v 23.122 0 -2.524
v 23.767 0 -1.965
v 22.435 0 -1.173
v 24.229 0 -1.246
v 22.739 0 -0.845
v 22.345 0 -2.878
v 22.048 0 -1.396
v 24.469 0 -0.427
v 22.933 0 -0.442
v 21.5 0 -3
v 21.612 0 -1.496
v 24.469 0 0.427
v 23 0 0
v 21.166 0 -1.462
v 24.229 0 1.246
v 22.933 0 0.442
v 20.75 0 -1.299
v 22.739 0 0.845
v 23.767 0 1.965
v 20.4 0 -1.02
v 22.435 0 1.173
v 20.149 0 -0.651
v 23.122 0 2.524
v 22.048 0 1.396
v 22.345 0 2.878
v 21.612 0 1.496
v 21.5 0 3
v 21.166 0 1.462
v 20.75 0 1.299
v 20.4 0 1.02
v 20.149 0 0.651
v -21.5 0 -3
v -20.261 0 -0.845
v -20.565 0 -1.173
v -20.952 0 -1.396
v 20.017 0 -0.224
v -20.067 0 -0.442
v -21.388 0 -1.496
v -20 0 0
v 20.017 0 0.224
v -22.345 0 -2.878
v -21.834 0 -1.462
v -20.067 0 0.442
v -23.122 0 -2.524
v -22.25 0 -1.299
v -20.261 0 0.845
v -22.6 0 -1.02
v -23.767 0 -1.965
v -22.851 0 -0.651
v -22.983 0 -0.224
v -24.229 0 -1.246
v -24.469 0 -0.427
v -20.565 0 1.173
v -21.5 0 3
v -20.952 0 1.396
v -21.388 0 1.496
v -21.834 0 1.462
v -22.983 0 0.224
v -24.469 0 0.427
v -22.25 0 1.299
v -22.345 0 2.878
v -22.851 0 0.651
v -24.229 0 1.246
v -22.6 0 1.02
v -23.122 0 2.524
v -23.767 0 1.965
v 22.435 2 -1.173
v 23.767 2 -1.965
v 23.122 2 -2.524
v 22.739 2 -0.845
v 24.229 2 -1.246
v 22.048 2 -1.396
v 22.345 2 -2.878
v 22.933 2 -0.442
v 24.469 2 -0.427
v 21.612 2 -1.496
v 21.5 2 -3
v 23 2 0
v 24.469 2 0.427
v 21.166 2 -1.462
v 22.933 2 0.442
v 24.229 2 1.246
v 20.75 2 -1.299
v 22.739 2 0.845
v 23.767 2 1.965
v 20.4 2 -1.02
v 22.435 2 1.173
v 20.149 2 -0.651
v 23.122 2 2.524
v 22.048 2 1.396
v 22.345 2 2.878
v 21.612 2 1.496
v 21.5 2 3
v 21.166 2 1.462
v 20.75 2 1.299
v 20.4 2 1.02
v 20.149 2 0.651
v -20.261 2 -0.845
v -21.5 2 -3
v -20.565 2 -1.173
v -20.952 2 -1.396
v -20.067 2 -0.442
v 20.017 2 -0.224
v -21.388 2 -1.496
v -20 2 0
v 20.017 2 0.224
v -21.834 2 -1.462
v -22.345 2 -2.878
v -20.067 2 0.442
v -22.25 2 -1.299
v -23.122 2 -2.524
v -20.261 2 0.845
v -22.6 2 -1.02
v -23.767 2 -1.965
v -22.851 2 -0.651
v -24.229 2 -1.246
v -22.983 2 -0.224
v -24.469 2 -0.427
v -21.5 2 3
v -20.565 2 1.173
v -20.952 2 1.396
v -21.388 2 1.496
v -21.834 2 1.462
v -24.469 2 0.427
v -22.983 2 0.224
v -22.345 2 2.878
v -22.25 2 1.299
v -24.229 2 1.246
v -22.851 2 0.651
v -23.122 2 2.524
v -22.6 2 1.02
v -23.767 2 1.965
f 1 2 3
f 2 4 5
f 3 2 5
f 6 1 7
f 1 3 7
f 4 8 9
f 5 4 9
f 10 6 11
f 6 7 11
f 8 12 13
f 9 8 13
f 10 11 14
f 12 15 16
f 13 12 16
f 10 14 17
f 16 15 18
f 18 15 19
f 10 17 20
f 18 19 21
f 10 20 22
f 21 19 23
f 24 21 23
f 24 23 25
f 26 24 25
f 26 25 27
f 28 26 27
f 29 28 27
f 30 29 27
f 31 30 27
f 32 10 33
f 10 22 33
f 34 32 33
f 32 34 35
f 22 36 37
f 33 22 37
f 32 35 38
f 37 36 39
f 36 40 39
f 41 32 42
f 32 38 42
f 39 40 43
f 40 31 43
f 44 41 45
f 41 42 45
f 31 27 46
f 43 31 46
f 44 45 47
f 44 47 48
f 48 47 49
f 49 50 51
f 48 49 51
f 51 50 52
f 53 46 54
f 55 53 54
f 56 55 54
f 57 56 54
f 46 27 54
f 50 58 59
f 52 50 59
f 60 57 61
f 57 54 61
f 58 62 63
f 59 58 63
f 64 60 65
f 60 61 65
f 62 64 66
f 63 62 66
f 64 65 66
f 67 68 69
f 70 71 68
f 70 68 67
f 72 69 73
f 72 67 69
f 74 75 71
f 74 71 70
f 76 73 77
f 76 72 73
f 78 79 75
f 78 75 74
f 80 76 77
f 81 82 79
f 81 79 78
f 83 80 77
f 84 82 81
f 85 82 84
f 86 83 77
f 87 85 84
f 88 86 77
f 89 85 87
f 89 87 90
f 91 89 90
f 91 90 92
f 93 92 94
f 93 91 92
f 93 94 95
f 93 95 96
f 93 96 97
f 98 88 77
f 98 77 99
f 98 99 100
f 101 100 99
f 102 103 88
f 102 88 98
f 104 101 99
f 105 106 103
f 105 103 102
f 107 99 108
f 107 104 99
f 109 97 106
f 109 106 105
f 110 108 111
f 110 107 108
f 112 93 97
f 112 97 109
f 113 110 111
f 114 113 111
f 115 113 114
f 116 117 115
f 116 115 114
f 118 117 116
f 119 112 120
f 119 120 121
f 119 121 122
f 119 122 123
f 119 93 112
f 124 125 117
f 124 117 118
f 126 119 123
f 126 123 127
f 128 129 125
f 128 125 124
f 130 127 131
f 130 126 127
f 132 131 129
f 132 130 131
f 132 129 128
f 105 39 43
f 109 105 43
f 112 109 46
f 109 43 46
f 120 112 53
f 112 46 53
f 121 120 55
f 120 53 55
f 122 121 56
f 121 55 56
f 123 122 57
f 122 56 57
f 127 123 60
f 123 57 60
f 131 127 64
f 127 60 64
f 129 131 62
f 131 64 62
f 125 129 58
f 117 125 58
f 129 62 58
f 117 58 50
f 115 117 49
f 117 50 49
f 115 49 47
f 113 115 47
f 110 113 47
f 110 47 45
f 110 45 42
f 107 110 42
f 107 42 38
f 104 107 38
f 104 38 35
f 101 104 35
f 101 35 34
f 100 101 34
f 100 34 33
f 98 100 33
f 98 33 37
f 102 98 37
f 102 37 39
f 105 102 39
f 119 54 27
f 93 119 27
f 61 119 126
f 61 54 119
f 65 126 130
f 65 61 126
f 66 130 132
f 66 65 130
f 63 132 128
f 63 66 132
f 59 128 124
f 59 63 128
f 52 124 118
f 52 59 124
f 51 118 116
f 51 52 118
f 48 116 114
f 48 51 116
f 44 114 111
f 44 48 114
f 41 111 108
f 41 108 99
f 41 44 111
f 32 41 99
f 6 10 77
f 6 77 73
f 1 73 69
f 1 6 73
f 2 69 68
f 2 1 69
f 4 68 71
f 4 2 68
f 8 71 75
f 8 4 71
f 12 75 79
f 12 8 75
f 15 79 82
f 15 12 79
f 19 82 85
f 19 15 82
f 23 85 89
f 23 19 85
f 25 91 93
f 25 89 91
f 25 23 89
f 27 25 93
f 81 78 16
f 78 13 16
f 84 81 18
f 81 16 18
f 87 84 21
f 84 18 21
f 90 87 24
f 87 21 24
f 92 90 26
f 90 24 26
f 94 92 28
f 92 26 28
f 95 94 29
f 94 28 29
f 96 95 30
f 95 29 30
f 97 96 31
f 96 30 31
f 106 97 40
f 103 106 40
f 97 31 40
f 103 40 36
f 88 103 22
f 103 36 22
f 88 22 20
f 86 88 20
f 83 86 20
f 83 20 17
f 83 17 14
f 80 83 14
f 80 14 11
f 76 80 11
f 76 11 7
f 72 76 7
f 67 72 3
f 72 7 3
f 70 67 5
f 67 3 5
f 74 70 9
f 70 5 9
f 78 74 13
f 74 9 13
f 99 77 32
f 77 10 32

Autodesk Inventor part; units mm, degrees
ref_plane "YZ Plane" through (0, 0, 0) normal (1, 0, 0) x (0, 1, 0)
ref_plane "XZ Plane" through (0, 0, 0) normal (0, 1, 0) x (-1, 0, 0)
ref_plane "XY Plane" through (0, 0, 0) normal (0, 0, 1) x (1, 0, 0)
sketch "Sketch1" plane through (0, 0, 0) normal (0, 1, 0) x (-1, 0, 0)
  line L0 (-21.5, -3) -> (21.5, -3)
  line L1 (21.5, -3) -> (21.5, 3)
  line L2 (21.5, 3) -> (-21.5, 3)
  line L3 (-21.5, 3) -> (-21.5, -3)
  line L4 (-21.5, -3) -> (21.5, 3) construction
  line L5 (21.5, -3) -> (-21.5, 3) construction
  circle A0 centre (21.5, 0) radius 3
  circle A1 centre (-21.5, 0) radius 3
  point P0 (0, 0)
  dimension "d0" = 43
  dimension "d1" = 6
extrude "Extrusion1" add sketch "Sketch1" along normal blind 2
sketch "Sketch2" plane through (0, 2, 0) normal (0, 1, 0) x (1, 0, 0)
  arc A0 (21.5, -3) -> (21.5, 3) centre (21.5, 0) ccw projected
  arc A1 (-21.5, 3) -> (-21.5, -3) centre (-21.5, 0) ccw projected
  circle A2 centre (-21.5, 0) radius 1.5
  circle A3 centre (21.5, 0) radius 1.5
  point P0 (0, 0)
  dimension "d5" = 3
  dimension "d6" = 3
extrude "Extrusion2" cut sketch "Sketch2" against normal blind 2
sketch "Sketch3" plane through (0, 0, 0) normal (0, -1, 0) x (1, 0, 0)
  circle A0 centre (-21.5, 0) radius 1.5 projected
  circle A1 centre (21.5, 0) radius 1.5 projected
  arc A2 (21.5, -3) -> (21.5, 3) centre (21.5, 0) ccw projected
  arc A3 (-21.5, 3) -> (-21.5, -3) centre (-21.5, 0) ccw projected
  circle A4 centre (-21.5, 0) radius 0.05
  circle A5 centre (21.5, 0) radius 0.05
  point P0 (0, 0)
  dimension "d9" = 0.1
  dimension "d10" = 0.1
extrude "Extrusion3" add sketch "Sketch3" against normal blind 2
sketch "Sketch4" plane through (0, 0, 0) normal (0, -1, 0) x (1, 0, 0)
  circle A0 centre (-21.5, 0) radius 0.05 projected
  circle A1 centre (21.5, 0) radius 0.05 projected
  arc A2 (21.5, -3) -> (21.5, 3) centre (21.5, 0) ccw projected
  arc A3 (-21.5, 3) -> (-21.5, -3) centre (-21.5, 0) ccw projected
  circle A4 centre (-21.5, 0) radius 1.5
  circle A5 centre (21.5, 0) radius 1.5
  point P0 (0, 0)
  dimension "d13" = 3
  dimension "d14" = 3
extrude "Extrusion4" cut sketch "Sketch4" against normal blind 2
properties part number "tahlo7"
